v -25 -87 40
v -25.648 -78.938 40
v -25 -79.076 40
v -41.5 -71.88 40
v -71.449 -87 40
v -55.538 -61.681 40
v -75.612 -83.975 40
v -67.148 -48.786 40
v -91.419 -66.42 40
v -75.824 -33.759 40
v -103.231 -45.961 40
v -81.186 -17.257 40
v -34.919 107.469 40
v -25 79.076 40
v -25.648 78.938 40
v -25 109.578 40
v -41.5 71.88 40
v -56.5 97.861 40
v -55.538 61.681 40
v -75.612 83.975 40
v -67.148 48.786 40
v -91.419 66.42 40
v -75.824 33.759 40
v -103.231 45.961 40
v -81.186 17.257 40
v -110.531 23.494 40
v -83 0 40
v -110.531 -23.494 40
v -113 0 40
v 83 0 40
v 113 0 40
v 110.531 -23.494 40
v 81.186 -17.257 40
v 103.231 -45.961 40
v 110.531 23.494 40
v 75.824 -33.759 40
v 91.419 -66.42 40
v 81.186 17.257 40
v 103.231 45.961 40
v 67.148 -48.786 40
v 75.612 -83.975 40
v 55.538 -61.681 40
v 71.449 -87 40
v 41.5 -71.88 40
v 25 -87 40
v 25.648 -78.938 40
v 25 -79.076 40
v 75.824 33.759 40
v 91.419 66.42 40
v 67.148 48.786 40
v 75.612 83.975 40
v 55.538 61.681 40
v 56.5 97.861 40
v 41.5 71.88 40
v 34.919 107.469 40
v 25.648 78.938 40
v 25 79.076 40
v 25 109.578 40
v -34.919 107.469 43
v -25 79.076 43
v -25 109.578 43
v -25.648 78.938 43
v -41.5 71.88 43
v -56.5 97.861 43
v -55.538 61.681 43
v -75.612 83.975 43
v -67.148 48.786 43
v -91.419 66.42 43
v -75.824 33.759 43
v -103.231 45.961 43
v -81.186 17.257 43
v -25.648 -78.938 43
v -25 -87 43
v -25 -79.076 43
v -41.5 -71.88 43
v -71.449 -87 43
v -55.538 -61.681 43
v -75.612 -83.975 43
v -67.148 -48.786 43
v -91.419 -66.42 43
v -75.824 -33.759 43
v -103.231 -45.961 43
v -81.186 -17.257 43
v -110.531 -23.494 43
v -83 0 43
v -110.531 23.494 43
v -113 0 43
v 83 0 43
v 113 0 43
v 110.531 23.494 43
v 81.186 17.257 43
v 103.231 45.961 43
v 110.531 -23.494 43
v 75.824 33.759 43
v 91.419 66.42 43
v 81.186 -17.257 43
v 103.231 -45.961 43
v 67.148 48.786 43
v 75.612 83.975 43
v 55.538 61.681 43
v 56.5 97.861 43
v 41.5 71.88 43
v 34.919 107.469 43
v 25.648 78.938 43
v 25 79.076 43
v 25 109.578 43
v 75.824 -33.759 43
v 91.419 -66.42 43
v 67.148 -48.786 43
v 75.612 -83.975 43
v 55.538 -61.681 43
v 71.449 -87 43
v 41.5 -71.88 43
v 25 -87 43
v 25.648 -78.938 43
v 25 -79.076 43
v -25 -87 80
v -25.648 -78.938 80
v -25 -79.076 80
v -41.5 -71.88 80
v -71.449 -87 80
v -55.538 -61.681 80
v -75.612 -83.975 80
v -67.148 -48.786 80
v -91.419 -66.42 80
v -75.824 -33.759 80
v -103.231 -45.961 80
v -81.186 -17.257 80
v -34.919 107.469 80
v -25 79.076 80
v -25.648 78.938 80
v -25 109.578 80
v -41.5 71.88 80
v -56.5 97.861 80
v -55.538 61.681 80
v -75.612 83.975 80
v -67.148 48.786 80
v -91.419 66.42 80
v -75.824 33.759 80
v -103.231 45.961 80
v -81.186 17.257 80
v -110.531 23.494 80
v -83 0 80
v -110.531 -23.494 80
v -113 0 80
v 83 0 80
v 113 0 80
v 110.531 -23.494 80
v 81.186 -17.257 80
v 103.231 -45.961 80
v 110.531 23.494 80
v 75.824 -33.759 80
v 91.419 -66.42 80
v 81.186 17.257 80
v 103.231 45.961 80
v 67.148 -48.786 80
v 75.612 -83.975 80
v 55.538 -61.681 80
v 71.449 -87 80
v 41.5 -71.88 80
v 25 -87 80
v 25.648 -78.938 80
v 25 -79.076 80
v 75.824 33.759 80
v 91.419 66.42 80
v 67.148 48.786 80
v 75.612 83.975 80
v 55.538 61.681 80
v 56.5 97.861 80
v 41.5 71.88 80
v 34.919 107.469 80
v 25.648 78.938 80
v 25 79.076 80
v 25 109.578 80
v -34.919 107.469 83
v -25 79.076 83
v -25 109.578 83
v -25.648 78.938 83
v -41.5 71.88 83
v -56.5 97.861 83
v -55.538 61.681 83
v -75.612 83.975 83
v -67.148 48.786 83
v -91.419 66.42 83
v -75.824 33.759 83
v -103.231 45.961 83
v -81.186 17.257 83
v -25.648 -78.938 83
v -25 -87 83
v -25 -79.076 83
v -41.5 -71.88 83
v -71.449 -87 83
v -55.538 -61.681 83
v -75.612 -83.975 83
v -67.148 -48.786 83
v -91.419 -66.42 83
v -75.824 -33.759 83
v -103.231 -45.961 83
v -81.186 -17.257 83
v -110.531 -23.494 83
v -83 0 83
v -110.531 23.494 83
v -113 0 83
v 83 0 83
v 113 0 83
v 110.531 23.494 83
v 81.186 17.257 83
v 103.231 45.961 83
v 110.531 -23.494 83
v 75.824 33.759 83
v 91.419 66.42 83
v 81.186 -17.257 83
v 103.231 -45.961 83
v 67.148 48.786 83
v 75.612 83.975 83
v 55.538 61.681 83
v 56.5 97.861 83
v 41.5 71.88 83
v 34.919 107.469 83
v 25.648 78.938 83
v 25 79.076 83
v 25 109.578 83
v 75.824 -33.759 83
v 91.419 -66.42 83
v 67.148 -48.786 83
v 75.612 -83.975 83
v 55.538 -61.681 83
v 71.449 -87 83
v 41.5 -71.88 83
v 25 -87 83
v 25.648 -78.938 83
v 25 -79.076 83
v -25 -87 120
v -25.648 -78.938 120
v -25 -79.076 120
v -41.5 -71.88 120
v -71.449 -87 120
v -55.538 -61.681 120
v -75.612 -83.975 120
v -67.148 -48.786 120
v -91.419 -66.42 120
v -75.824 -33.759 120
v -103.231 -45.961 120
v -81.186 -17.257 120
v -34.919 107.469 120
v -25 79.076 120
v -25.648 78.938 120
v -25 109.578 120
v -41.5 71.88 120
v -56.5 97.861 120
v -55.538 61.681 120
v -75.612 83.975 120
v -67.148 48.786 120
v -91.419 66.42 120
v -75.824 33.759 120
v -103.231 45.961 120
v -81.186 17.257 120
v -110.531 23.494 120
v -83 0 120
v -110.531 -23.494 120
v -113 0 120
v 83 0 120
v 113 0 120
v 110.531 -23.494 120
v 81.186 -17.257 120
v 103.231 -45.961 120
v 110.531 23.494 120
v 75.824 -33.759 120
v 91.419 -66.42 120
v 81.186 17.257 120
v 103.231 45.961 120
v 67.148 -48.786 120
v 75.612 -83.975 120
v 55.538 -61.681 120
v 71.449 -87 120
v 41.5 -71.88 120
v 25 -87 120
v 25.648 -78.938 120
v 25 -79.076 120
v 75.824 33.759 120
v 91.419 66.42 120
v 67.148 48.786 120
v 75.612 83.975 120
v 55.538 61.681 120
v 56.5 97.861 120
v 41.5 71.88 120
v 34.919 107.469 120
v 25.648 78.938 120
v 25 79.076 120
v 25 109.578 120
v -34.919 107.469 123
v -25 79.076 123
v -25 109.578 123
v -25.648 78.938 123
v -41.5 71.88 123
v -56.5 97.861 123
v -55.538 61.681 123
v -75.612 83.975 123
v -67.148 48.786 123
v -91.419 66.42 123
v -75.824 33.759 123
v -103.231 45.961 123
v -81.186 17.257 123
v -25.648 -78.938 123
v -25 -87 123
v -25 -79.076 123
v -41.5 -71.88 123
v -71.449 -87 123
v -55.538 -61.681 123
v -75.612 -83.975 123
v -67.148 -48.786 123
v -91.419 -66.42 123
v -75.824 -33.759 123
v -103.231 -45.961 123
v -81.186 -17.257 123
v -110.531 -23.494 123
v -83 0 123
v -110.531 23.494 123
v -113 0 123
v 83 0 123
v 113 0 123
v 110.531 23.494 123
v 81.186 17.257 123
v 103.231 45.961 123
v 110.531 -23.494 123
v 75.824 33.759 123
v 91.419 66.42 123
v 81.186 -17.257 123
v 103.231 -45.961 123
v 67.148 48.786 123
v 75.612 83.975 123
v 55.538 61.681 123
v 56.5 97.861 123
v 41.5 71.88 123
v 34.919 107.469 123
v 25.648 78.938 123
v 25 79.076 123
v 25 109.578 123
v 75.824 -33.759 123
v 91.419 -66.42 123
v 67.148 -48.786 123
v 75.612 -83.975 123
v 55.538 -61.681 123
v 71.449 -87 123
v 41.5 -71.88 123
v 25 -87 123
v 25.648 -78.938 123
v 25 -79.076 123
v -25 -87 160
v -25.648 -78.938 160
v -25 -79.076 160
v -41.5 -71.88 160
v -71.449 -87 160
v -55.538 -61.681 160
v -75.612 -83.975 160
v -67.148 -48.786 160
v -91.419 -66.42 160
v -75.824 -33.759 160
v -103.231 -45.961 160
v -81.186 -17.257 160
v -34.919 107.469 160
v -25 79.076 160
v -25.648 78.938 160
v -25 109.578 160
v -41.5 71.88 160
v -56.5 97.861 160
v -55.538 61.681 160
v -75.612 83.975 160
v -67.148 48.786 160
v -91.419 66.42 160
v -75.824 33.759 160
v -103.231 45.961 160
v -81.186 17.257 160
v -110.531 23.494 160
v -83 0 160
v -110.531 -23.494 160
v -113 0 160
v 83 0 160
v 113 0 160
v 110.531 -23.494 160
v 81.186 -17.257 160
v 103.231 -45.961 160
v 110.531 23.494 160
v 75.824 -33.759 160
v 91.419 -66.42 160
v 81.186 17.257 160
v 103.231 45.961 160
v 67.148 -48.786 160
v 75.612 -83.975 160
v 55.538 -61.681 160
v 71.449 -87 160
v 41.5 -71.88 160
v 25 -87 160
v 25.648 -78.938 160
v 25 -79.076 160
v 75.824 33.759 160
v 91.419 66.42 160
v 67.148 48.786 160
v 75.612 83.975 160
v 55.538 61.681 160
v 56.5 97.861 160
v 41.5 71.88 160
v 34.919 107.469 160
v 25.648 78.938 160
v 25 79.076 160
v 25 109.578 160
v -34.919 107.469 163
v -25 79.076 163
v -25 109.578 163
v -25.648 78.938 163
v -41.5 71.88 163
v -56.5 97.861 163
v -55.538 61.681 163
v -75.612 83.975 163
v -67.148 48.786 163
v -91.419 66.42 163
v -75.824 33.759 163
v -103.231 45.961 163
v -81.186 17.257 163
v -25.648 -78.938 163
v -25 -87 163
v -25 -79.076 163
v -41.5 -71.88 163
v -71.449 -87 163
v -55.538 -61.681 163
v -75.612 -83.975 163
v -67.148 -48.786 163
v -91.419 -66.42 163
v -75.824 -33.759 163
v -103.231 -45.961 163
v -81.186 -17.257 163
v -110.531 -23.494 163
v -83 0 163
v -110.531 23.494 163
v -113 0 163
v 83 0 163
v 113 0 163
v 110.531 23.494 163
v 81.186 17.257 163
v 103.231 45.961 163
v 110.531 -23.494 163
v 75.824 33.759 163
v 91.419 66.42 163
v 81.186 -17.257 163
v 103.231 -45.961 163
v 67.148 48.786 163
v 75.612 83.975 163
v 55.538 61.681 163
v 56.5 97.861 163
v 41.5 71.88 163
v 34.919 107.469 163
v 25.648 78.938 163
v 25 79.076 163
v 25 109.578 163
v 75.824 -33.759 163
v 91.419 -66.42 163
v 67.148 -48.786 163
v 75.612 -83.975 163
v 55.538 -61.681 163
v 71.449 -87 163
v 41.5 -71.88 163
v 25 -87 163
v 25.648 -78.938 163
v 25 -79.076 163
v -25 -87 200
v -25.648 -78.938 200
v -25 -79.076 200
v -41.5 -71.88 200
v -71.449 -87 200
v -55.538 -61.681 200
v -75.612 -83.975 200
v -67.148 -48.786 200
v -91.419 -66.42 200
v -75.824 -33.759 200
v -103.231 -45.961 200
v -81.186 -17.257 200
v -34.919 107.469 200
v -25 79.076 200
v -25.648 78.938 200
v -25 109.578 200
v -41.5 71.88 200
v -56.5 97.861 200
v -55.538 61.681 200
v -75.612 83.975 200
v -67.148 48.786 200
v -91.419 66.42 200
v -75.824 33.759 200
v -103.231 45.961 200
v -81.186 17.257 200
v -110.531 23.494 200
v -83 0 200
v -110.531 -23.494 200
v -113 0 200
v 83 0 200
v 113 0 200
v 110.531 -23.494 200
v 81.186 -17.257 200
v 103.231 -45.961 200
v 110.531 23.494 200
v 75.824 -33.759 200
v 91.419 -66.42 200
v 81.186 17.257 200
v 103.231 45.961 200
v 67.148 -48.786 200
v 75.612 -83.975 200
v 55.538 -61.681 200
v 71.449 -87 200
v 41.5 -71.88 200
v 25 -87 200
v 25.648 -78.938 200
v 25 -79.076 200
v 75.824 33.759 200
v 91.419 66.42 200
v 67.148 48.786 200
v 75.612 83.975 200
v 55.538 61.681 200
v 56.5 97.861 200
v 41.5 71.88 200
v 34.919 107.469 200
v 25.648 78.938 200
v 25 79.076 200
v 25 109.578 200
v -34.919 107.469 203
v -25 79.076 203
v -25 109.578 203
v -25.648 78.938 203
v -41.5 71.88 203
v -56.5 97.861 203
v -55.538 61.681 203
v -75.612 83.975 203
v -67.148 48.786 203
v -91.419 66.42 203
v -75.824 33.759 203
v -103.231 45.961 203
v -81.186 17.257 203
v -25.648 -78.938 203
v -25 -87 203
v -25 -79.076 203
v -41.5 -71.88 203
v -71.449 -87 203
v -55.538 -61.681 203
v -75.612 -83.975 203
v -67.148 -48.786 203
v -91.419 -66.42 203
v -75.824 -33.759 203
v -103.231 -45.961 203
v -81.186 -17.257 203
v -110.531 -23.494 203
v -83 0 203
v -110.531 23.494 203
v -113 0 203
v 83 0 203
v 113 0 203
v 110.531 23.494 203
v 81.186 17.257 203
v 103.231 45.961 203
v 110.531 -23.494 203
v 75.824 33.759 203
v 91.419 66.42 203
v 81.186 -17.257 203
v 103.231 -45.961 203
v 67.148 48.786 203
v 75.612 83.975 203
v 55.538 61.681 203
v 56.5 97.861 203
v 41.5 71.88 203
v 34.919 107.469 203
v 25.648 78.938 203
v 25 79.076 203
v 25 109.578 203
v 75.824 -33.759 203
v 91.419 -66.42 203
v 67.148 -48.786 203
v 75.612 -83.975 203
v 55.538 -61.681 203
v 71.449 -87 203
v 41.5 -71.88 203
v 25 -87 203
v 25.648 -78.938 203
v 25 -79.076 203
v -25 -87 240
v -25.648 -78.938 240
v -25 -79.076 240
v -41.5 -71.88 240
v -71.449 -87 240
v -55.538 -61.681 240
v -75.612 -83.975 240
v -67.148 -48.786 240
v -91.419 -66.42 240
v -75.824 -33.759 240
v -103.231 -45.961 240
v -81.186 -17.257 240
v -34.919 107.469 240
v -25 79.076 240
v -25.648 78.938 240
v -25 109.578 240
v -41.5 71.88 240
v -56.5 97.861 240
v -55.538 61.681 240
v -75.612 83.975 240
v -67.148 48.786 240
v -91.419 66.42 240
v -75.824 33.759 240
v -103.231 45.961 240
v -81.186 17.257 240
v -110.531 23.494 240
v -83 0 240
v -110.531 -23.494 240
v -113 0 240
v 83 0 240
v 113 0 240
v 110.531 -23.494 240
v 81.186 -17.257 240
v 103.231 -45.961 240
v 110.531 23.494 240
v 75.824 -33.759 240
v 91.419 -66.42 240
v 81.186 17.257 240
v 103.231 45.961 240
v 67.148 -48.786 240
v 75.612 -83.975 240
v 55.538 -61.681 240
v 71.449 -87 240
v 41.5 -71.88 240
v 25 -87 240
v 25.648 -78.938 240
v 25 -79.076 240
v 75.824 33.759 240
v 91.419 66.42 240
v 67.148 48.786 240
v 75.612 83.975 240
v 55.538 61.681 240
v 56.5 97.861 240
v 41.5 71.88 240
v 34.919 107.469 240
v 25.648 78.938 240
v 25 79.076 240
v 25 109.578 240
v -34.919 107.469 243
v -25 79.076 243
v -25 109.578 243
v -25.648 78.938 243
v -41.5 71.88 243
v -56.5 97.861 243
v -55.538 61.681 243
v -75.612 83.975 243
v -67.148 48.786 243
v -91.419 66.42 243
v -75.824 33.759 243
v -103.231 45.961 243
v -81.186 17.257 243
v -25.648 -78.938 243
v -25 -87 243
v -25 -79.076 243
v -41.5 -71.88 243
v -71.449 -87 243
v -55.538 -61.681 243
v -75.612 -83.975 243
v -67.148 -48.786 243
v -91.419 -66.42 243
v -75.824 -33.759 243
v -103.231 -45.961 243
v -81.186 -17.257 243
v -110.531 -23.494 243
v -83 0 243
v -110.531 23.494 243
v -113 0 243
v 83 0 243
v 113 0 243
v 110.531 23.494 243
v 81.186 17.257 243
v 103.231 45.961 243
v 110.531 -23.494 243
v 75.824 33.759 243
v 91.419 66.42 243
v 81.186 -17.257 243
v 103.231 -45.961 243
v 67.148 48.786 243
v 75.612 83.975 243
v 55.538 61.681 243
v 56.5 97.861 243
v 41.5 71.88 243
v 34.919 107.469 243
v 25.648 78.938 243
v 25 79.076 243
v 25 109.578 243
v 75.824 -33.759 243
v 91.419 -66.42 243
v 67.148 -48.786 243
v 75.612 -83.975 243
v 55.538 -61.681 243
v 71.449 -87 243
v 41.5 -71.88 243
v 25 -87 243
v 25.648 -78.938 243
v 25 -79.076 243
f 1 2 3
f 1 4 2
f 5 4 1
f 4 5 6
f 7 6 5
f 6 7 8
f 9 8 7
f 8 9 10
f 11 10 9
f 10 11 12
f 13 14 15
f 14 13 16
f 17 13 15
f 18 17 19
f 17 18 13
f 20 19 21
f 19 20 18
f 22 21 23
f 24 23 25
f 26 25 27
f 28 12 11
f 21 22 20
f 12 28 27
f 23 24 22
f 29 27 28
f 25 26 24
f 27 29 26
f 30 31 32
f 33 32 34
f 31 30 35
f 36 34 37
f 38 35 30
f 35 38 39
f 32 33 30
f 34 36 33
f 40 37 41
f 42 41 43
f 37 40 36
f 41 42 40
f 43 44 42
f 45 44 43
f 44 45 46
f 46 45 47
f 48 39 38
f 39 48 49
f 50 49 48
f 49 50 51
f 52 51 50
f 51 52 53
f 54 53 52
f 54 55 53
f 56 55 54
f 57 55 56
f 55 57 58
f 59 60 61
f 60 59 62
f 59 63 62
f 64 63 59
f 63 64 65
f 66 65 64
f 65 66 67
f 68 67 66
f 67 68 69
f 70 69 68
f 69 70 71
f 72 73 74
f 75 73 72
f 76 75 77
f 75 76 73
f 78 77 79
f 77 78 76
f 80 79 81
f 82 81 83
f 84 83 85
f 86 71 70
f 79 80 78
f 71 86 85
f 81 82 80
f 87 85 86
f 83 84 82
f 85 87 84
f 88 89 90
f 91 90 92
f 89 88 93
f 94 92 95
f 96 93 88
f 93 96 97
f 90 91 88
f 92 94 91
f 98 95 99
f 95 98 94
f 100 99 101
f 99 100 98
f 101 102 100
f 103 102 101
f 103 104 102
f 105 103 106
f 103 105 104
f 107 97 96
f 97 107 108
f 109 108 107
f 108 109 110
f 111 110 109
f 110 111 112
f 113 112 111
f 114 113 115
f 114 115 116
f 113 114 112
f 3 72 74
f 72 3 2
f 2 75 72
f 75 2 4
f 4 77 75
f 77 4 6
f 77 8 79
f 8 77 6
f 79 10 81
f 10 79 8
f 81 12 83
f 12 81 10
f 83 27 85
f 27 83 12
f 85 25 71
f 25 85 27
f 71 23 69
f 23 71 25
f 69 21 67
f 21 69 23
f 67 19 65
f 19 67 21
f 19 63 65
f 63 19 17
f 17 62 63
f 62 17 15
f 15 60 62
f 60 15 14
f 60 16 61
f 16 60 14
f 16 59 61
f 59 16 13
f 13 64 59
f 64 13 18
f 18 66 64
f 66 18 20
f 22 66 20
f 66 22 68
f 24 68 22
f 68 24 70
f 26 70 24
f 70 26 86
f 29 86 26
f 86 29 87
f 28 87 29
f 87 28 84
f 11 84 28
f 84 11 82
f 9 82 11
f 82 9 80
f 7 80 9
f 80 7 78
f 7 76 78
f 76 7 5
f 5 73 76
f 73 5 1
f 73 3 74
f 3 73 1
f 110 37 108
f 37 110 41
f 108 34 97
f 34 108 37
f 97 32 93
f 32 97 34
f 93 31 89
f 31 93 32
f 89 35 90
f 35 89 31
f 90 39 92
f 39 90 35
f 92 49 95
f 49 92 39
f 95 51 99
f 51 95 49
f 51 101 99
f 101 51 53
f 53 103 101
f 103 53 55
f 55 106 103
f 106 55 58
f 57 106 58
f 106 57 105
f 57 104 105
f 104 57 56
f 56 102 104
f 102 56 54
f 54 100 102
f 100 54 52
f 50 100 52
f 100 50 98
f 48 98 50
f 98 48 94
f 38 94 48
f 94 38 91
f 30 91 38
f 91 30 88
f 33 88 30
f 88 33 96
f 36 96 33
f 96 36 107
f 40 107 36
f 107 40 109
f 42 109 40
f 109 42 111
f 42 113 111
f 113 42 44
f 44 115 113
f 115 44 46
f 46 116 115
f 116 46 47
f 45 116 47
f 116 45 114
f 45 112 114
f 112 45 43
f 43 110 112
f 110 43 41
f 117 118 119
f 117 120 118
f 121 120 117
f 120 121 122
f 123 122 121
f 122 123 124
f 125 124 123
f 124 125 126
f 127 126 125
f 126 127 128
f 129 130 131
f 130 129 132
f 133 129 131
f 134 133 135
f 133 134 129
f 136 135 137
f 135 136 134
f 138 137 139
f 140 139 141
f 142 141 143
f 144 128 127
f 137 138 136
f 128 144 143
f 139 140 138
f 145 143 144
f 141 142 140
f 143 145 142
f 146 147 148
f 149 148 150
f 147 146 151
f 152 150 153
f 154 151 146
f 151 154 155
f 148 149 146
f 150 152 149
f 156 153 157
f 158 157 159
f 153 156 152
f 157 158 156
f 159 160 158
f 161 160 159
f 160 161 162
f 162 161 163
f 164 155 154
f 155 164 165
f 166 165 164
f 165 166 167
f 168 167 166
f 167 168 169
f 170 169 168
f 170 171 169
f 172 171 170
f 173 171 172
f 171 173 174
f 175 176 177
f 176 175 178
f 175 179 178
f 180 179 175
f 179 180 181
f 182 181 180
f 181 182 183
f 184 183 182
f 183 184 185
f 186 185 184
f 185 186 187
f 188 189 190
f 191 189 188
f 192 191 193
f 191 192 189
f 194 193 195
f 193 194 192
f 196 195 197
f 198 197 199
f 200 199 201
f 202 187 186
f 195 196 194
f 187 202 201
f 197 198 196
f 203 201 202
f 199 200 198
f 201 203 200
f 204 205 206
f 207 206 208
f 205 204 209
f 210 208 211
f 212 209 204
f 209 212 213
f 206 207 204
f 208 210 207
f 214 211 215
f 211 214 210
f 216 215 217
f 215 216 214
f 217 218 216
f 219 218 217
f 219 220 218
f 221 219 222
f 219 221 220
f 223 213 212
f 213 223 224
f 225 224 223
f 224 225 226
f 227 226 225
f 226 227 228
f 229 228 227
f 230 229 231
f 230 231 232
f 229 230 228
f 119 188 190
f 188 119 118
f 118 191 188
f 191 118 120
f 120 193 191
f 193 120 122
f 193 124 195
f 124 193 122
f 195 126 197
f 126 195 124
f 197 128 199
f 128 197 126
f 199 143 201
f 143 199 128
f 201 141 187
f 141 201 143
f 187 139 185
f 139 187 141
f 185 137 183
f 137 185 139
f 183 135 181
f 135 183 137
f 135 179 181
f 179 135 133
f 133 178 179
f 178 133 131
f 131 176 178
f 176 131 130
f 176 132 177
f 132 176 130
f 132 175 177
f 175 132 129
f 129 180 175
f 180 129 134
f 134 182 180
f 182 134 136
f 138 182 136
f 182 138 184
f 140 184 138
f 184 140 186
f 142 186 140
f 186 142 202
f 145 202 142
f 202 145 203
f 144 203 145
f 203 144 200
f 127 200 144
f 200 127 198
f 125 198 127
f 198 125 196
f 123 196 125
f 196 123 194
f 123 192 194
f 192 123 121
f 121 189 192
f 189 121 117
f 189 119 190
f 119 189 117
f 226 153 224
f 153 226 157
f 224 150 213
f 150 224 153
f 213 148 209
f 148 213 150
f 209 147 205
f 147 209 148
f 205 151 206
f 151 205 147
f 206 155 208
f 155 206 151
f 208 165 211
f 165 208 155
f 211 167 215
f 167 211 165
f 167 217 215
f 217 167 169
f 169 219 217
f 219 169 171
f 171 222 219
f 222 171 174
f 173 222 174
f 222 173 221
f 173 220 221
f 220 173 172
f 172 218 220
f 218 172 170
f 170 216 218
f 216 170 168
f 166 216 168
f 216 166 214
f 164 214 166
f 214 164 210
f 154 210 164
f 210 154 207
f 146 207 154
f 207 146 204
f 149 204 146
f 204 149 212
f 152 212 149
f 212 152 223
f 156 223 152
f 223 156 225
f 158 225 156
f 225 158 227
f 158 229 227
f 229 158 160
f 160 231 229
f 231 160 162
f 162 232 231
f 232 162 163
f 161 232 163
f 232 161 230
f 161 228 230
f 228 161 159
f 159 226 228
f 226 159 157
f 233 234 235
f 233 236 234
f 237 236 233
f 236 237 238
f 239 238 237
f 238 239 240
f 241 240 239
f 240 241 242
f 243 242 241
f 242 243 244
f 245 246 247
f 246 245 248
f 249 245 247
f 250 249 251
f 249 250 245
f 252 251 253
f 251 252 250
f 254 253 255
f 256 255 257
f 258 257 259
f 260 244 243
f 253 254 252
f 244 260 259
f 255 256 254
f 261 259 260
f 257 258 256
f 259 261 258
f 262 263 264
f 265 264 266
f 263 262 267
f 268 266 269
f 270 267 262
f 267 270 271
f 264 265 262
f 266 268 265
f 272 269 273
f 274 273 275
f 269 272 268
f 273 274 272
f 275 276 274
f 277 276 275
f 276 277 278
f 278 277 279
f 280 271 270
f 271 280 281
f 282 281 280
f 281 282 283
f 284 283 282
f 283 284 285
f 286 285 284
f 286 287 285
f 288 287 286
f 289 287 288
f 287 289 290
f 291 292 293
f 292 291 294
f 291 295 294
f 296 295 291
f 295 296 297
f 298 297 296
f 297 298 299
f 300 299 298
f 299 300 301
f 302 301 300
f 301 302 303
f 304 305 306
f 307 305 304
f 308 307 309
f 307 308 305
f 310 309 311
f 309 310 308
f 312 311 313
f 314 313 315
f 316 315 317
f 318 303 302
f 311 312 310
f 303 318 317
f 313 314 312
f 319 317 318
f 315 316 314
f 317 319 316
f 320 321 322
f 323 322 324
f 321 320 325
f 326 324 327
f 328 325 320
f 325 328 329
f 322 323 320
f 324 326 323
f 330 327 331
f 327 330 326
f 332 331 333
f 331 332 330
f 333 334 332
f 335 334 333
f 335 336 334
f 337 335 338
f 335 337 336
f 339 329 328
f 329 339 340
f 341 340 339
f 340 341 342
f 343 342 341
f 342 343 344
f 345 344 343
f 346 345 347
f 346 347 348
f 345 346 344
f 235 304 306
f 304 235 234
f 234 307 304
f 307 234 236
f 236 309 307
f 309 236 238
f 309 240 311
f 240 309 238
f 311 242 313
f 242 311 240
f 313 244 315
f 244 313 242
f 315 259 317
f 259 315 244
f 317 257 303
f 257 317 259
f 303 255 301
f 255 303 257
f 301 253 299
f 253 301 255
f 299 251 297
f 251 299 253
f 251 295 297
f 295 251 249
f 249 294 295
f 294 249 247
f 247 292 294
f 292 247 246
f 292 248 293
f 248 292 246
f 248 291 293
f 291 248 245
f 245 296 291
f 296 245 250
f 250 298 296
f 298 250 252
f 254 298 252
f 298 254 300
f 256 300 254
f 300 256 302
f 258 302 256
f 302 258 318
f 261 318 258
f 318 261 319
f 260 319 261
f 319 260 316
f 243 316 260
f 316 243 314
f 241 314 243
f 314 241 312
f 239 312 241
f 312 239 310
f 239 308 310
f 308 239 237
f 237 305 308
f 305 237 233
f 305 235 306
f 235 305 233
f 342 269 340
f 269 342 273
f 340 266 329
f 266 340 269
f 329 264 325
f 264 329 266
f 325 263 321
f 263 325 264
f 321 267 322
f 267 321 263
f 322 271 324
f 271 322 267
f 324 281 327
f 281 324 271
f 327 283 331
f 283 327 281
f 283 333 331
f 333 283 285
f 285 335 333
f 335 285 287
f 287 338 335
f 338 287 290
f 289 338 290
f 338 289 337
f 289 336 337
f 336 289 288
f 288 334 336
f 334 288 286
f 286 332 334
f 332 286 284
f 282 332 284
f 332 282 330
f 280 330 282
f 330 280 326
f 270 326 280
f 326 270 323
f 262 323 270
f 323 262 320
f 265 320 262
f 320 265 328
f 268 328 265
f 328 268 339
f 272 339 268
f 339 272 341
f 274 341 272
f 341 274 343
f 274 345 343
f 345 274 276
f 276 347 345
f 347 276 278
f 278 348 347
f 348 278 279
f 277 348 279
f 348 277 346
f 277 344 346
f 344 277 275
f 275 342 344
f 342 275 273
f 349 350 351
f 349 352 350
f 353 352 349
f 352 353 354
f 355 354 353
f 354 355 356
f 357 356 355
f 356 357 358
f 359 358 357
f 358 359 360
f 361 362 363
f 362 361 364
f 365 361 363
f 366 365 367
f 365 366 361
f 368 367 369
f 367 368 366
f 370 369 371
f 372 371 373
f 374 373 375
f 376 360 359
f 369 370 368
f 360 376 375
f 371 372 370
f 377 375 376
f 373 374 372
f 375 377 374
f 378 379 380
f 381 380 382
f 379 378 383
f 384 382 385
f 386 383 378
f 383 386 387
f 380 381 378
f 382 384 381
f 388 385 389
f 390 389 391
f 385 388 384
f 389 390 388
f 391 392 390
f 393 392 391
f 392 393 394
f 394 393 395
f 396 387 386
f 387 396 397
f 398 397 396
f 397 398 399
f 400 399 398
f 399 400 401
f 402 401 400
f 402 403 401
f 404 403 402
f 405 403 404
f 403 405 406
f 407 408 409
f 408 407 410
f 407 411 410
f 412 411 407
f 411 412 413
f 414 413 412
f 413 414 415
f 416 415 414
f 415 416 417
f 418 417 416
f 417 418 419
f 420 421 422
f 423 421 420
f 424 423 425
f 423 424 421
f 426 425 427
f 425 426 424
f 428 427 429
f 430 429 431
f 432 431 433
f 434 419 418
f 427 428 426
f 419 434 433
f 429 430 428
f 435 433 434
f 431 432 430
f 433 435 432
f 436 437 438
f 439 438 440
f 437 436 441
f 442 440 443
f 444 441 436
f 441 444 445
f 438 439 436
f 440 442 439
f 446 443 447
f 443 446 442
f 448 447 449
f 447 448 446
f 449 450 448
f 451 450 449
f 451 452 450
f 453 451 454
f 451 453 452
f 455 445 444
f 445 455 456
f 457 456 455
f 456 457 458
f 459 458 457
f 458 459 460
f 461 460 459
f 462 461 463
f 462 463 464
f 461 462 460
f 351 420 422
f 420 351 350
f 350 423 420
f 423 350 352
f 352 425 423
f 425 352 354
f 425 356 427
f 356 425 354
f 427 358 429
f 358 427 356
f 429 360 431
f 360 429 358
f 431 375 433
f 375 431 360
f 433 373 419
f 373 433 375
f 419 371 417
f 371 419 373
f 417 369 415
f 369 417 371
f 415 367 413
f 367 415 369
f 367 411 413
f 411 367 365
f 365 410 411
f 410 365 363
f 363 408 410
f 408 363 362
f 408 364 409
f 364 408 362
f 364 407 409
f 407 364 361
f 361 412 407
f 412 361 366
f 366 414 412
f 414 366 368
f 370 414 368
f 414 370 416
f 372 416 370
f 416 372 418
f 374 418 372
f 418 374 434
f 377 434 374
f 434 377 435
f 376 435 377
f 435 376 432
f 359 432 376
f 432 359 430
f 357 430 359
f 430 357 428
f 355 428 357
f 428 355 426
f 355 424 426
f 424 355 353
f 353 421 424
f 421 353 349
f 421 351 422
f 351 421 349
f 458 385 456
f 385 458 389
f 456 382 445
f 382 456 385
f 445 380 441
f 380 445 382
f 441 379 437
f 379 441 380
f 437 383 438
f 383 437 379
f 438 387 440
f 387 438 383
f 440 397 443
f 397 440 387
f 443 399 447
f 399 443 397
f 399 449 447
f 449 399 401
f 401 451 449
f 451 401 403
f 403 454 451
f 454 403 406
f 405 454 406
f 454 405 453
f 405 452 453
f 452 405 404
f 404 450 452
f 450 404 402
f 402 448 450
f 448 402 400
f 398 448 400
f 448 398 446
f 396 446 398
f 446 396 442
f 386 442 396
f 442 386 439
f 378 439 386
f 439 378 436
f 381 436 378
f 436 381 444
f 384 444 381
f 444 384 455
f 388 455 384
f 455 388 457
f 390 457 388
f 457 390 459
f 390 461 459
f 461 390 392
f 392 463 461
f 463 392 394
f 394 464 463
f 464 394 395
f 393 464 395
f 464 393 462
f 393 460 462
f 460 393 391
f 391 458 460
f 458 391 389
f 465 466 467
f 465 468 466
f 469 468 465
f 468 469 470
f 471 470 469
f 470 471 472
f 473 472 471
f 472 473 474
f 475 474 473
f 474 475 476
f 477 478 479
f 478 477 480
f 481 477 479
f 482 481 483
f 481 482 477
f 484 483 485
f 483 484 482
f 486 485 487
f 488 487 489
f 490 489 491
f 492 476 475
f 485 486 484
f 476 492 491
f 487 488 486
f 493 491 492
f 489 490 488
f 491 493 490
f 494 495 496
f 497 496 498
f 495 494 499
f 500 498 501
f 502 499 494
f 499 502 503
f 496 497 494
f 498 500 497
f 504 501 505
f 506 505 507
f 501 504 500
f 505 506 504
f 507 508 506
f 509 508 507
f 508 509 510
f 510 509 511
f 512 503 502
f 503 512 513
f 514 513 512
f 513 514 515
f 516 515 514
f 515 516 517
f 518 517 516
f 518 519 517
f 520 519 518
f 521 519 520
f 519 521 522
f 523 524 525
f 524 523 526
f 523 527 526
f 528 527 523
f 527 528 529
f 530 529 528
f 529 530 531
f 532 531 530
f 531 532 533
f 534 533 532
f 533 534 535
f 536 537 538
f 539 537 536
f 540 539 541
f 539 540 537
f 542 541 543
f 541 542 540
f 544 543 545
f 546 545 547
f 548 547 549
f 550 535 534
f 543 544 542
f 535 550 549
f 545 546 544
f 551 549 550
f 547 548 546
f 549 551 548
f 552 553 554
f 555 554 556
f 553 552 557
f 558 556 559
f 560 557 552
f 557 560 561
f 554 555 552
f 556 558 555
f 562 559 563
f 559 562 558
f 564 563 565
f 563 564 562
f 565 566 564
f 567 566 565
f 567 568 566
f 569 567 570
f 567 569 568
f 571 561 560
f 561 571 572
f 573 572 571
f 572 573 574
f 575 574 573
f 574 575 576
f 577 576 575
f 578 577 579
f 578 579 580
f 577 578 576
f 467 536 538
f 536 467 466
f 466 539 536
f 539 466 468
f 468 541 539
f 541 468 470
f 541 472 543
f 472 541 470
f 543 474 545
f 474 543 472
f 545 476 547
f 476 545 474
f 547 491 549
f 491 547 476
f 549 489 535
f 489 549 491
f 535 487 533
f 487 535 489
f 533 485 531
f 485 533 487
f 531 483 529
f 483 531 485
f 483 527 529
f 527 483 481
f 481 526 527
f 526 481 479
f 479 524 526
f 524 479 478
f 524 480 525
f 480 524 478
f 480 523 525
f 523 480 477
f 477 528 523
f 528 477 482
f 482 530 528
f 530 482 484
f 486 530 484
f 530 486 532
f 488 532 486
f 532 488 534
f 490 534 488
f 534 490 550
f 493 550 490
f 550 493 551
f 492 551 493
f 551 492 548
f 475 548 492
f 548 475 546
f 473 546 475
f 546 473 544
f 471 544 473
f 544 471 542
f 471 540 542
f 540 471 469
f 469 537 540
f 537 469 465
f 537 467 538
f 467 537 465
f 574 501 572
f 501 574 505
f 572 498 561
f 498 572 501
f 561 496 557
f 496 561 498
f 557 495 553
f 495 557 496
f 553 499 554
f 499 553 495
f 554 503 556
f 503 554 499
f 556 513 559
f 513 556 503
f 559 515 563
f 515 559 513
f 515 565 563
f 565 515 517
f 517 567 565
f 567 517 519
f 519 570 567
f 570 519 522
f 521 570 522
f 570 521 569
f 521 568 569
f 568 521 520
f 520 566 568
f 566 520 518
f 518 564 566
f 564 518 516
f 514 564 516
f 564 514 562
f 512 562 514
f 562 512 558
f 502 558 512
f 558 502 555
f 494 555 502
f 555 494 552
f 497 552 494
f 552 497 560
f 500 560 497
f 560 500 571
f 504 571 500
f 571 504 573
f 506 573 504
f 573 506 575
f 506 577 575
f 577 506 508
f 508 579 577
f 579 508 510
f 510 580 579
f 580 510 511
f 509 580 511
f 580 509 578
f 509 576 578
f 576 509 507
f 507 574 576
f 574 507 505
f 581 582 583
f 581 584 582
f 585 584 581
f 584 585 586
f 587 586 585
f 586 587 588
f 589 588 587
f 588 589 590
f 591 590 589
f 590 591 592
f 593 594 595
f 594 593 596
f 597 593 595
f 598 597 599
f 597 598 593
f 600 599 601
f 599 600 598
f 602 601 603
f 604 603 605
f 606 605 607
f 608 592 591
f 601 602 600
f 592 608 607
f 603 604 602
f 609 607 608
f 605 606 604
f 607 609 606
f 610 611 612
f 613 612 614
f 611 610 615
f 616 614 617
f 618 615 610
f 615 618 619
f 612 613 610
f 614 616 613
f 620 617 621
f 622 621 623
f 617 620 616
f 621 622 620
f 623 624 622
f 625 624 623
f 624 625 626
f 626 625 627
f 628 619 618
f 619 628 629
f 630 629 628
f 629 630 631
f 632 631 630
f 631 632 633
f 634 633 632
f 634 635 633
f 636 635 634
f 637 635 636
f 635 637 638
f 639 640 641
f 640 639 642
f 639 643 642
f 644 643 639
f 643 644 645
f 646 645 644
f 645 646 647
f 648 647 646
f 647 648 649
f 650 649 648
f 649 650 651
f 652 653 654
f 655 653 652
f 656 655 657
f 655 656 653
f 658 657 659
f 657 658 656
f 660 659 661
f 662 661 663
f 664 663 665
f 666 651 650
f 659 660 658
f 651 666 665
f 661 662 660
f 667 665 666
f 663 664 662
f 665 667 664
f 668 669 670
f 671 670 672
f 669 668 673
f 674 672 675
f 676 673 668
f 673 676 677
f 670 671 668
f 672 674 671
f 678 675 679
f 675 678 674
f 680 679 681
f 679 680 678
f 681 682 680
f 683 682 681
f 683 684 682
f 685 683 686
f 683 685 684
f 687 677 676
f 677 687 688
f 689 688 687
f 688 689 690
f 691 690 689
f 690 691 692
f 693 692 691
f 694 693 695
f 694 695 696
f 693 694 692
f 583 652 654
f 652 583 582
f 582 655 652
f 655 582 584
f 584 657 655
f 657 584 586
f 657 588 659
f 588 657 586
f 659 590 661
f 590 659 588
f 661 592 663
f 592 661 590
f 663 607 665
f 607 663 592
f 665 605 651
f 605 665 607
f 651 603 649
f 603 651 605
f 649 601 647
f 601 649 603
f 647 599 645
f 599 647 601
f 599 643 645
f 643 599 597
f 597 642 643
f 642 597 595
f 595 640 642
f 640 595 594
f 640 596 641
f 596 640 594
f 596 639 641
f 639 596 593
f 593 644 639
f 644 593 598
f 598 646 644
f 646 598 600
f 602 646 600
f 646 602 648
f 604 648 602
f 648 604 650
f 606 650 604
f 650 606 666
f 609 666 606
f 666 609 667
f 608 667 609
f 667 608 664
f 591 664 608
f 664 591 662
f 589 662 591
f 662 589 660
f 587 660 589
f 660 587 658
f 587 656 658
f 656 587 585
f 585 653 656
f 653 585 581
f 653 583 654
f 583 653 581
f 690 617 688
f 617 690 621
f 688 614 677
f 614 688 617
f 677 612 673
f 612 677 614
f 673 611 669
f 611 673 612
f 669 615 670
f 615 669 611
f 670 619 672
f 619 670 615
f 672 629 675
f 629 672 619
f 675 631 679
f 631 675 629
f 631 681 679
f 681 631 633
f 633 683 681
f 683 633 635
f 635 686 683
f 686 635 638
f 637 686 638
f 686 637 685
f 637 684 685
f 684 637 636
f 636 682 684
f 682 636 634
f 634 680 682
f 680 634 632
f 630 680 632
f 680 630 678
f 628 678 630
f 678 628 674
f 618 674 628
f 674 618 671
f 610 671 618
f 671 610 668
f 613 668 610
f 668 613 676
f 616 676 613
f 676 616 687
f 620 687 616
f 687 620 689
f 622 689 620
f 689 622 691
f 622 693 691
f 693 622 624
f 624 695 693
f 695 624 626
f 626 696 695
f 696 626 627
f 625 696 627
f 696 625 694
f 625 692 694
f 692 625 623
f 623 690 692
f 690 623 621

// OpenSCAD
raum_hoehe = 245;
raum_durchmesser = 226;
cut_hoehe = 26;

regal_tiefe = 60;
regal_abstand = 40;

module draufsicht() {
    intersection() {
        difference() {
            circle(d = raum_durchmesser);
            circle(d = raum_durchmesser - regal_tiefe);
            square([50, raum_durchmesser], center = true);
        }
        translate([0, cut_hoehe, 0])
            square(raum_durchmesser, center = true);
    }
}

module ebene() {
    linear_extrude(3)
    draufsicht();    
}    

for(i = [regal_abstand:regal_abstand:raum_hoehe])
    translate([0, 0, i]) ebene();
